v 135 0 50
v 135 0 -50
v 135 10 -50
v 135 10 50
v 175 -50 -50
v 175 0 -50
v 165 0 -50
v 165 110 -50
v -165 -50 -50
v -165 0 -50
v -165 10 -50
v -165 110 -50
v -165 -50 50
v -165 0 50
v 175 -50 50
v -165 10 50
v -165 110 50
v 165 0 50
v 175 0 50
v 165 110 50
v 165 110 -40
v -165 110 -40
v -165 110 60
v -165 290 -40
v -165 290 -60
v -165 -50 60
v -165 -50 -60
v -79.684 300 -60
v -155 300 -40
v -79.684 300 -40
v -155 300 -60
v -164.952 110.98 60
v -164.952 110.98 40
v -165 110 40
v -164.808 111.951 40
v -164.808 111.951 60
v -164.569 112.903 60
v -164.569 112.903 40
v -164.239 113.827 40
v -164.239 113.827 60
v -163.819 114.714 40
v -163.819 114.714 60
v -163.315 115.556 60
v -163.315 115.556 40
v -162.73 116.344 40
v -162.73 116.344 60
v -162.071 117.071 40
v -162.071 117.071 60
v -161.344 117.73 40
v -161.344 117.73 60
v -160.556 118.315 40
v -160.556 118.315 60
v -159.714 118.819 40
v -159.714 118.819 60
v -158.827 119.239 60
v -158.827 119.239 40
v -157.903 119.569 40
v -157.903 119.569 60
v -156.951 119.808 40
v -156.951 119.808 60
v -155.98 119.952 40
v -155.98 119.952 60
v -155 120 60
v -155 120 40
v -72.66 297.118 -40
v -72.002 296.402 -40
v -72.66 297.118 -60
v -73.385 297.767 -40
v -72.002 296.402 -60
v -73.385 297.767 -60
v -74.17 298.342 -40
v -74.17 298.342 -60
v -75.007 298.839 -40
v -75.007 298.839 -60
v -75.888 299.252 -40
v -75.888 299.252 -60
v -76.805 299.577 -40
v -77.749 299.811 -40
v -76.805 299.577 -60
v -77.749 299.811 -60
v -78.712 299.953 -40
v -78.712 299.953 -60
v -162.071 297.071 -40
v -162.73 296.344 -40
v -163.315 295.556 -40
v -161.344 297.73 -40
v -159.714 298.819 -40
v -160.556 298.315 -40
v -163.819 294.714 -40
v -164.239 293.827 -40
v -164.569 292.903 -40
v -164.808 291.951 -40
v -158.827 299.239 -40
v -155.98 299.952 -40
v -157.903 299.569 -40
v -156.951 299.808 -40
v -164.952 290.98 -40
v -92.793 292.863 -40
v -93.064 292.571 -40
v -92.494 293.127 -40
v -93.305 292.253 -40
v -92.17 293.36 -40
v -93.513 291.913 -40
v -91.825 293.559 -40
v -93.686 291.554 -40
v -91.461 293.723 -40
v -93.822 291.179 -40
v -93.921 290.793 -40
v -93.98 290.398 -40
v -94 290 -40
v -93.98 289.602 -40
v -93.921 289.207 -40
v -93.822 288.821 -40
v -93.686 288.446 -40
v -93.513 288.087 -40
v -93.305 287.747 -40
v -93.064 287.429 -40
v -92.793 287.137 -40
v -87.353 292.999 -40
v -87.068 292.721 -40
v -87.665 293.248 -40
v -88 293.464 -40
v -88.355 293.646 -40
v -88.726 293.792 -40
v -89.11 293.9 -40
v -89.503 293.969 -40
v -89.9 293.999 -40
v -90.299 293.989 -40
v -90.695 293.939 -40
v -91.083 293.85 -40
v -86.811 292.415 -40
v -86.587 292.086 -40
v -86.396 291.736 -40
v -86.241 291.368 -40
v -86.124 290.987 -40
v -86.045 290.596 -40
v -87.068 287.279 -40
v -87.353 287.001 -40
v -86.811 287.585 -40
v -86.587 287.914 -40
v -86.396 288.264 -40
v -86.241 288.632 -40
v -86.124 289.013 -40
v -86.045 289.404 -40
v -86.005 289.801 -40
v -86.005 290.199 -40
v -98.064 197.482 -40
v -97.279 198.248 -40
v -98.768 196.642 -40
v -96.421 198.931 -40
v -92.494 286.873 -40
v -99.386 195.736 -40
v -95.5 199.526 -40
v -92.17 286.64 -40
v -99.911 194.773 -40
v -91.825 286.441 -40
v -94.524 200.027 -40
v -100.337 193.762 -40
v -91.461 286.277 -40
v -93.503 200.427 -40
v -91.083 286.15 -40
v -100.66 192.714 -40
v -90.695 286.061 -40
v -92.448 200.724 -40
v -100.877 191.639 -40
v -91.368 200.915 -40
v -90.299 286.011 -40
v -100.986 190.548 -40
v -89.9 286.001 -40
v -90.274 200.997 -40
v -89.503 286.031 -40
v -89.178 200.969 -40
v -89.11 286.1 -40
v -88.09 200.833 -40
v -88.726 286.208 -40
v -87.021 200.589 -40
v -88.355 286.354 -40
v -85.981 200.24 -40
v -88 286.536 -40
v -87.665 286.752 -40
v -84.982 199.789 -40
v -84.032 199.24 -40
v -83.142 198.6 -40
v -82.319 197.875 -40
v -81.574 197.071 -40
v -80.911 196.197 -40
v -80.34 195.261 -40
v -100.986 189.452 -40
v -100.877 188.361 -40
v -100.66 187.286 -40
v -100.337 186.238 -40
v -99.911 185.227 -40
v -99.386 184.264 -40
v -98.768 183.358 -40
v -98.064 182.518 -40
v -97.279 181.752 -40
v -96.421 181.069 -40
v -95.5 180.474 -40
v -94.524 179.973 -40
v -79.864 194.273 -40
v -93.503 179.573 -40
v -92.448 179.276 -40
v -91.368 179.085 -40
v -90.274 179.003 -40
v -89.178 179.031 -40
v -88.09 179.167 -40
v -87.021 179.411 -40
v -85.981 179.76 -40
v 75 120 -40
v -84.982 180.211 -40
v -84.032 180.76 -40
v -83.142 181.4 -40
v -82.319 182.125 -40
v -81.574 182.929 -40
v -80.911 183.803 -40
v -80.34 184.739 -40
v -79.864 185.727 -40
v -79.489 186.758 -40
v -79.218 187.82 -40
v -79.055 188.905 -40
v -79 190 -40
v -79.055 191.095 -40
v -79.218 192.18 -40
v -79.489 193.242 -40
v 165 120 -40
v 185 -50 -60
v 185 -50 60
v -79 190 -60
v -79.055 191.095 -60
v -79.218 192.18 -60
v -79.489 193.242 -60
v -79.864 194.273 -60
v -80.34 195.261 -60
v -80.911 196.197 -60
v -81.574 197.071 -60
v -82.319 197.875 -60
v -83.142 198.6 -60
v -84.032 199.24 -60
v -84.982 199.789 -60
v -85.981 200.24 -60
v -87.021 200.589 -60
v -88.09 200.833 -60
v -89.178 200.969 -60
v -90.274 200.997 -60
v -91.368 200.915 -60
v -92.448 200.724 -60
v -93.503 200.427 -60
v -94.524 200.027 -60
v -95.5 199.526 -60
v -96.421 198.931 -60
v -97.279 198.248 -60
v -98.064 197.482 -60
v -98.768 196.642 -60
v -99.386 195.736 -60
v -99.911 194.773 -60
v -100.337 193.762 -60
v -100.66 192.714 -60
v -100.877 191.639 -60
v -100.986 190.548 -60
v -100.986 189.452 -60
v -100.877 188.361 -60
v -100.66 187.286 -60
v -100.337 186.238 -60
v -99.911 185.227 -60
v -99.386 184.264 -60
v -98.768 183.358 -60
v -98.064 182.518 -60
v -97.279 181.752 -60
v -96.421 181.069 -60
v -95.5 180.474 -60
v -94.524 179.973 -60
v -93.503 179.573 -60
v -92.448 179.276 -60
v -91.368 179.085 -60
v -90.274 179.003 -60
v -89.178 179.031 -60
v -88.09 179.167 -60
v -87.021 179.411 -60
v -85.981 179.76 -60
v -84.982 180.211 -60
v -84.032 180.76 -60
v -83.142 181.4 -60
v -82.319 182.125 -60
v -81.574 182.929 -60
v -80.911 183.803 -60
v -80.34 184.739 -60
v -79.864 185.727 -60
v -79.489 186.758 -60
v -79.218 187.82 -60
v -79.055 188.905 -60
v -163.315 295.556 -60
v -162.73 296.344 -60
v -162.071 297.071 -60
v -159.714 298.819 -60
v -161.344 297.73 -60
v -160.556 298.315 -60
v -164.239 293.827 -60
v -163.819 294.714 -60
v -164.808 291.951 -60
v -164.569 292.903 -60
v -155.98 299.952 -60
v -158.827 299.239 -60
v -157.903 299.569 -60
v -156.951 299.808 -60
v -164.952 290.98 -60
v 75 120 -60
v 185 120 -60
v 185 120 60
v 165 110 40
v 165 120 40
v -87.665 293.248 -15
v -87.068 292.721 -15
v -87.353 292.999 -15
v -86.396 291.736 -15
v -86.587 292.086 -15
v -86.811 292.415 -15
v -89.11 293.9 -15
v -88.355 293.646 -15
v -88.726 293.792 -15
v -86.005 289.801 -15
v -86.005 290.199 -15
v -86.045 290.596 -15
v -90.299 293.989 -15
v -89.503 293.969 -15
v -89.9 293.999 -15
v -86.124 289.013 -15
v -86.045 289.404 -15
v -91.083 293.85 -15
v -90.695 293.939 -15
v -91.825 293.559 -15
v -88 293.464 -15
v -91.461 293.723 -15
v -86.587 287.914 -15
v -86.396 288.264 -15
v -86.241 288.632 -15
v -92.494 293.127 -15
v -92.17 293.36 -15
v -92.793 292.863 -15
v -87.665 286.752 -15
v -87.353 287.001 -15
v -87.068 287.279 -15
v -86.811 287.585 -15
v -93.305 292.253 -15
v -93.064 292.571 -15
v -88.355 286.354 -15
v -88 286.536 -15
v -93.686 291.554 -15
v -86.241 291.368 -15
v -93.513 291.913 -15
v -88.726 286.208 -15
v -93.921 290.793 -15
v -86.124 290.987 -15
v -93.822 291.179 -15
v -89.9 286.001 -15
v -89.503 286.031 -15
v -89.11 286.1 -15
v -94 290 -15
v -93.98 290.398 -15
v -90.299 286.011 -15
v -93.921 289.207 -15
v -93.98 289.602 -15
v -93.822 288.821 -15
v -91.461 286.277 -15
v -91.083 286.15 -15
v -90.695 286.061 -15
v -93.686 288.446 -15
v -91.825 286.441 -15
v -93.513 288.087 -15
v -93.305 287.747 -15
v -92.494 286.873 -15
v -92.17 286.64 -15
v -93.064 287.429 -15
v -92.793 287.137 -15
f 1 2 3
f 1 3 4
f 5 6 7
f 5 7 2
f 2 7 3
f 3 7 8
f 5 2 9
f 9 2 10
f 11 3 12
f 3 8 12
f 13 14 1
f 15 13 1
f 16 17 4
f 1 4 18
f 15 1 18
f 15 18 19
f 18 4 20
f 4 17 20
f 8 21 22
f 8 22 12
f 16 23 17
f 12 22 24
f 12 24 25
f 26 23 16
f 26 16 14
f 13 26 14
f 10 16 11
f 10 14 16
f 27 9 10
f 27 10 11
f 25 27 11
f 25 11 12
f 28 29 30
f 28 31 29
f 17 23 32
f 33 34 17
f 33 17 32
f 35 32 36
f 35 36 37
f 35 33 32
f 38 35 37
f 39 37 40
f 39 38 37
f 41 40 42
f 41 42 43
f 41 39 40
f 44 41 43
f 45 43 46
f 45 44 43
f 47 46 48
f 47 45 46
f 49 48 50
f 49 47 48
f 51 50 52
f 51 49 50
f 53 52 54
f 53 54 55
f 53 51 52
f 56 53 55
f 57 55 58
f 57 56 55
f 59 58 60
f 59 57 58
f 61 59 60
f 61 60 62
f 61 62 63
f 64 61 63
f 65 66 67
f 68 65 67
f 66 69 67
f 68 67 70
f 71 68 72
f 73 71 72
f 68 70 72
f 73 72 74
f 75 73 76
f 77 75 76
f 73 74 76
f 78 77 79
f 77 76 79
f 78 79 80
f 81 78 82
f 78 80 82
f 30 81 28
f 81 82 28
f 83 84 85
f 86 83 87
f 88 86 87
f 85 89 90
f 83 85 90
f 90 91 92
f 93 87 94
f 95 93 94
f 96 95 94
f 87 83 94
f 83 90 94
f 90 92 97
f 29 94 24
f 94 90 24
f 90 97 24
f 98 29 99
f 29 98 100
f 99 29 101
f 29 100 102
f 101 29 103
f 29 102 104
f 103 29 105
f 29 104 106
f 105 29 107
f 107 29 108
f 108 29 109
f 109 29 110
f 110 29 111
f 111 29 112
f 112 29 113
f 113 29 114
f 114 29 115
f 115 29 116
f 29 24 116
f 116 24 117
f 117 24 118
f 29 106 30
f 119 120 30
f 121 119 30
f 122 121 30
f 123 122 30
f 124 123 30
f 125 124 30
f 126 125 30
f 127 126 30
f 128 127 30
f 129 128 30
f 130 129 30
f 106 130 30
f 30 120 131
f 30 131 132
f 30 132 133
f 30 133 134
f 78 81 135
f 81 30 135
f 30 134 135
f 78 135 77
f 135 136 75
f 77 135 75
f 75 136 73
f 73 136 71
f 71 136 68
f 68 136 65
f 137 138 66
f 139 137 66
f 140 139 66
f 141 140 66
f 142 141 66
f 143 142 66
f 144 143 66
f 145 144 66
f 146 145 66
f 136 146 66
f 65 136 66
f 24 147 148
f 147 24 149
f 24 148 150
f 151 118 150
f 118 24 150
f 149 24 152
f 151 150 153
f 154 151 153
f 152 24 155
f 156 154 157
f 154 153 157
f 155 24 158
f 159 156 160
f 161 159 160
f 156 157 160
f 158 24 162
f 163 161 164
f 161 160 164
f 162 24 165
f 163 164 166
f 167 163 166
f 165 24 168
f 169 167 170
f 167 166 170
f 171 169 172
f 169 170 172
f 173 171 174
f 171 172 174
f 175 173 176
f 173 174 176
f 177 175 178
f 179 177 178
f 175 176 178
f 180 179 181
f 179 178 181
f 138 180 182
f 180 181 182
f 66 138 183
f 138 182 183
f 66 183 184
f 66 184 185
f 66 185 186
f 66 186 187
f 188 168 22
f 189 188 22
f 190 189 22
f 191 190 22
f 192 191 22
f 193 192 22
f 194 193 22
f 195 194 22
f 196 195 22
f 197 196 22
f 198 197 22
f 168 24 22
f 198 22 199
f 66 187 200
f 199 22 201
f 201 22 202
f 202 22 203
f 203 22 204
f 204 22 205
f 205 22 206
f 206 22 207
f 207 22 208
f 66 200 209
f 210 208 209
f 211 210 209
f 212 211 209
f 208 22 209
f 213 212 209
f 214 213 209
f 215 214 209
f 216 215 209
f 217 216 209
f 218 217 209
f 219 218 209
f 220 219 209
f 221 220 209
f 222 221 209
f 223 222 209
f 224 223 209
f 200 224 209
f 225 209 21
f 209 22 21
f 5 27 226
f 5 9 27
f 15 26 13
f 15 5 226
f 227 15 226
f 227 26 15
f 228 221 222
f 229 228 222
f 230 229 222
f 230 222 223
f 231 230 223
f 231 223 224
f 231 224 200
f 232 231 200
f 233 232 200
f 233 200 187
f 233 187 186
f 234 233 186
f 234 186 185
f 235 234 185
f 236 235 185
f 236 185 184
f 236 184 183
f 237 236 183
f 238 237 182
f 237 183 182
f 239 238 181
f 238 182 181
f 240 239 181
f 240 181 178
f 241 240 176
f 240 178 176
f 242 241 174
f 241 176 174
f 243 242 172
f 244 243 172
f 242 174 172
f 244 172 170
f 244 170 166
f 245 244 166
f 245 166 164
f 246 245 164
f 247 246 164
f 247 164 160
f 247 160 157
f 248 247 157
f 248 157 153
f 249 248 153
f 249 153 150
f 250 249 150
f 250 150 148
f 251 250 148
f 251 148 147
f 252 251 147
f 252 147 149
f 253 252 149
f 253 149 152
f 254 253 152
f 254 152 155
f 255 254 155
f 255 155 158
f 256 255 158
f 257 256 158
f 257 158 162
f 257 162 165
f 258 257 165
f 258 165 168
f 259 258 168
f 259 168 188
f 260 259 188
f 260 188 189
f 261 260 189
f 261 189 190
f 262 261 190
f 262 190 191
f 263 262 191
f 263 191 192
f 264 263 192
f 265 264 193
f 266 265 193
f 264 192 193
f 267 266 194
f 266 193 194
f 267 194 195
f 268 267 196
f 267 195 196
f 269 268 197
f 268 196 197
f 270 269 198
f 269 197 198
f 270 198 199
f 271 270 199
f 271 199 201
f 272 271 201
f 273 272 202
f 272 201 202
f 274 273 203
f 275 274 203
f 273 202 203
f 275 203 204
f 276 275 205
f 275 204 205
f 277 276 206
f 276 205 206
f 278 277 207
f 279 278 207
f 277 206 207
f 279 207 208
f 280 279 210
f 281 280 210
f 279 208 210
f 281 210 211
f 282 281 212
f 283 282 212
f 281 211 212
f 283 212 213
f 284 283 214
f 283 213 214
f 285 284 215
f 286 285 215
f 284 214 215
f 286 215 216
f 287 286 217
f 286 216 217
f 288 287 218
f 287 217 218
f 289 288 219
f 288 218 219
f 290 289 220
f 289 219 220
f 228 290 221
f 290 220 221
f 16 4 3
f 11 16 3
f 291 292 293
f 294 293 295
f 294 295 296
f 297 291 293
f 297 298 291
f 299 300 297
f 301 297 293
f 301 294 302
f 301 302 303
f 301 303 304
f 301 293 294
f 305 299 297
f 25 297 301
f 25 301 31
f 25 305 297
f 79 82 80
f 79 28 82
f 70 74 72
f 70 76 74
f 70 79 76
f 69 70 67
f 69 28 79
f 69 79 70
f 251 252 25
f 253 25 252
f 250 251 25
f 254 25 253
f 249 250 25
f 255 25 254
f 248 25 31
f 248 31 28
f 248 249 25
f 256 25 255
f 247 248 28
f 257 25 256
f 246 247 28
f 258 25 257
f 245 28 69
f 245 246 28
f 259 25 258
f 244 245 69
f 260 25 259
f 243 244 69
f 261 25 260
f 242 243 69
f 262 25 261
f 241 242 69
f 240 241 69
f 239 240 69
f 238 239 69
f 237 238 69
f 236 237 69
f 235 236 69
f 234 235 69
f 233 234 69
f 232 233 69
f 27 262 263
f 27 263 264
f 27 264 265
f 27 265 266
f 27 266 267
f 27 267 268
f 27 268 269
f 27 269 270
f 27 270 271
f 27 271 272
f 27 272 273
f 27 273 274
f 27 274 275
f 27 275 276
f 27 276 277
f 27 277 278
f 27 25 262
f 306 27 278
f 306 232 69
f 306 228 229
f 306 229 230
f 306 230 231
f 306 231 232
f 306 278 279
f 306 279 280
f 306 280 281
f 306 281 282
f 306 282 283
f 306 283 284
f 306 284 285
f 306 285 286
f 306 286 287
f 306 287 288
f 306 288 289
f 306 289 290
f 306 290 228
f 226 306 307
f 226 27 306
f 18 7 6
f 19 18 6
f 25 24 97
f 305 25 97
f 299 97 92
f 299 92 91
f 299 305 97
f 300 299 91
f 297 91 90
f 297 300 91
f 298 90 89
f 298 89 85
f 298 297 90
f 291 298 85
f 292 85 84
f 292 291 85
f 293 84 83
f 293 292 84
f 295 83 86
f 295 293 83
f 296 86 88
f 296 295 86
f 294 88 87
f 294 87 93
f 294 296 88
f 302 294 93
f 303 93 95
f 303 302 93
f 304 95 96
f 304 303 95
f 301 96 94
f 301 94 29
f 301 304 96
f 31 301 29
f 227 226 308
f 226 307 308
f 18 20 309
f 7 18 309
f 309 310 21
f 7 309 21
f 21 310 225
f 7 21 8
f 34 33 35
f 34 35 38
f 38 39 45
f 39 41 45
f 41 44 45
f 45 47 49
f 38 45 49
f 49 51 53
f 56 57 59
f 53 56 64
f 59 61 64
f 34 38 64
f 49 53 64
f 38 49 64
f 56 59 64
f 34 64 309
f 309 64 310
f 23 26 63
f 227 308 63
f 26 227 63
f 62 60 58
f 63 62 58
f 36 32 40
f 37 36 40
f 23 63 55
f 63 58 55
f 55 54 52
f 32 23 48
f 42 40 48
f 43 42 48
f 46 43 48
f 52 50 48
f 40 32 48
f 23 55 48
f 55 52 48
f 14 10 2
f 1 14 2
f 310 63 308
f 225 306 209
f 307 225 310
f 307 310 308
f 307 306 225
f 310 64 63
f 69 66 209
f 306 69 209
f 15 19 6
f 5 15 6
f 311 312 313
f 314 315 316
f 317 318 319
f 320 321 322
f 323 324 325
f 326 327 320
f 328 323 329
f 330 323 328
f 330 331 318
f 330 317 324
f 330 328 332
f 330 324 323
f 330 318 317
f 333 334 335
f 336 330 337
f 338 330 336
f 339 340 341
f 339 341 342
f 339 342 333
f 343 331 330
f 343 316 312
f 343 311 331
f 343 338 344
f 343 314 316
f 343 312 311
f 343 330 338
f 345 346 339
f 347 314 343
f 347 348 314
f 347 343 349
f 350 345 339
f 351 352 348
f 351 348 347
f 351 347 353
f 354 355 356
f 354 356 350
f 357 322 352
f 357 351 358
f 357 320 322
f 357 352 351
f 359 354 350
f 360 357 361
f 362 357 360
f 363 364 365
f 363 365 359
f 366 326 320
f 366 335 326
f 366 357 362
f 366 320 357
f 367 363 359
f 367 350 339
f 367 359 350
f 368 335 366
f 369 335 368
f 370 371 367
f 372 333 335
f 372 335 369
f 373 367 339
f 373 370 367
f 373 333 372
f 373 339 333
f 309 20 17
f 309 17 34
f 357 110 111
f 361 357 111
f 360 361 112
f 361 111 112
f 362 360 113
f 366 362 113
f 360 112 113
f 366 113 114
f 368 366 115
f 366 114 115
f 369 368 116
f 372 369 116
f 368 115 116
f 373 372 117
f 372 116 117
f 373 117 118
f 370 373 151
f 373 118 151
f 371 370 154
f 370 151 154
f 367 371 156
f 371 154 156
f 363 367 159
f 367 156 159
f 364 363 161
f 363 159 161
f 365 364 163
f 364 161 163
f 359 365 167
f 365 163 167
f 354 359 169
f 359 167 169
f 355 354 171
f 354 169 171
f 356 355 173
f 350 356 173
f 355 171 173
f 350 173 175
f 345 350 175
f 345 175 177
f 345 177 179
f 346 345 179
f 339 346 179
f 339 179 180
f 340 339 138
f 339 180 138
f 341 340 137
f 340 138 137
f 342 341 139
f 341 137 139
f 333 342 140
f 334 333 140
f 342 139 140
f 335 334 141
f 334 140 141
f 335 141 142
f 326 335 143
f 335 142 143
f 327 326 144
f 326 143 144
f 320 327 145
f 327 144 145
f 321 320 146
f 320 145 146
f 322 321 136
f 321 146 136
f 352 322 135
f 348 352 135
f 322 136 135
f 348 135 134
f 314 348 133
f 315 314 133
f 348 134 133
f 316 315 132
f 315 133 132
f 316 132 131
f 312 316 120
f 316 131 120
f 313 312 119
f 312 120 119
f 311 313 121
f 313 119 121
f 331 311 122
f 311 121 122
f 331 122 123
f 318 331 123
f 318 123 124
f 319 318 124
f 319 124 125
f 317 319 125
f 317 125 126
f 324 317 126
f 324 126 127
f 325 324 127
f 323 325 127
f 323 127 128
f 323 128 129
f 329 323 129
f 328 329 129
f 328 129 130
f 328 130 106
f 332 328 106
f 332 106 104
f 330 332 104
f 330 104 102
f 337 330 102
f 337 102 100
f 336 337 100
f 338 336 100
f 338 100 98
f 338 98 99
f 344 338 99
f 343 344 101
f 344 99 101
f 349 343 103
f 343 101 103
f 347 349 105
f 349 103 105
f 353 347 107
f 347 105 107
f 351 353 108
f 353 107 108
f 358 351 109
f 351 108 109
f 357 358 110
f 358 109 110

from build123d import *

# Parameters (mm, degrees)
SKETCH1_W           = 330
SKETCH1_H           = 120
BOSS_EXTRUDE1_DEPTH = 120
SKETCH2_W           = 100
SKETCH2_H           = 100
CUT_EXTRUDE1_DEPTH  = 357.230262611
CUT_EXTRUDE2_REACH  = 214.662
SKETCH5_W           = 330
SKETCH5_H           = 80
SKETCH6_W           = 40
SKETCH6_H           = 20
BOSS_EXTRUDE2_DEPTH = 180
SKETCH9_R           = 4
BOSS_EXTRUDE3_DEPTH = 25
SKETCH11_W          = 20
SKETCH11_H          = 120
EXTRUDE_THIN1_DEPTH = 120
CUT_EXTRUDE3_REACH  = 359.526
SKETCH12_W          = 30
SKETCH12_H          = 100
EXTRUDE_THIN2_DEPTH = 50
BOSS_EXTRUDE5_DEPTH = 20
FILLET1_R           = 10
SKETCH9_4_R         = 11
CUT_EXTRUDE4_DEPTH  = 367.367302034
SKETCH17_W          = 50
SKETCH17_H          = 20
BOSS_EXTRUDE6_DEPTH = 180
FILLET6_R           = 10


with BuildPart() as part:
    # Sketch1 → Boss-Extrude1 (new body)
    with BuildSketch(Plane(origin=(0, 0, 0), x_dir=(1, 0, 0), z_dir=(0, 1, 0))):
        Rectangle(SKETCH1_W, SKETCH1_H)
    extrude(amount=BOSS_EXTRUDE1_DEPTH)

    # Sketch2 → Cut-Extrude1 (cut, through all)
    with BuildSketch(Plane(origin=(165, 0, 0), x_dir=(0, 0, -1), z_dir=(1, 0, 0))):
        with Locations((0, 60)):
            Rectangle(SKETCH2_W, SKETCH2_H)
    extrude(amount=-CUT_EXTRUDE1_DEPTH, mode=Mode.SUBTRACT)

    # Sketch5 → Cut-Extrude2 (cut, up to next)
    with BuildSketch(Plane(origin=(0, 120, 0), x_dir=(1, 0, 0), z_dir=(0, 1, 0)), mode=Mode.PRIVATE) as cut_extrude2_sk1:
        Rectangle(SKETCH5_W, SKETCH5_H)
    cut_extrude2_tool1 = extrude(cut_extrude2_sk1.sketch, amount=-CUT_EXTRUDE2_REACH, mode=Mode.PRIVATE) & part.part
    add(cut_extrude2_tool1.solids().sort_by_distance((0, 120, 0))[0], mode=Mode.SUBTRACT)

    # Sketch6 → Boss-Extrude2 (add)
    with BuildSketch(Plane(origin=(0, 120, 0), x_dir=(1, 0, 0), z_dir=(0, 1, 0))):
        with Locations((-95, 50)):
            Rectangle(SKETCH6_W, SKETCH6_H)
    extrude(amount=BOSS_EXTRUDE2_DEPTH)

    # Sketch9 → Boss-Extrude3 (add)
    with BuildSketch(Plane.XY.offset(-40)):
        with Locations(Location((-90, 290, 0), (0, 0, 180))):
            Circle(SKETCH9_R)
    extrude(amount=BOSS_EXTRUDE3_DEPTH)

    # Sketch11 → Extrude-Thin1 (add, through all)
    with BuildSketch(Plane(origin=(0, 120, 0), x_dir=(1, 0, 0), z_dir=(0, 1, 0))):
        with Locations((175, 0)):
            Rectangle(SKETCH11_W, SKETCH11_H)
    extrude(amount=-EXTRUDE_THIN1_DEPTH)

    # Sketch12 → Cut-Extrude3 (cut, up to next)
    with BuildSketch(Plane.XZ, mode=Mode.PRIVATE) as cut_extrude3_sk1:
        with Locations((150, 0)):
            Rectangle(SKETCH12_W, SKETCH12_H)
    cut_extrude3_tool1 = extrude(cut_extrude3_sk1.sketch, amount=-CUT_EXTRUDE3_REACH, mode=Mode.PRIVATE) & part.part
    add(cut_extrude3_tool1.solids().sort_by_distance((150, 0, 0))[0], mode=Mode.SUBTRACT)

    # Sketch14 → Extrude-Thin2 (add)
    with BuildSketch(Plane.XZ):
        Polygon((-165, -60), (185, -60), (185, 60), (-165, 60), (-165, 50), (175, 50), (175, -50), (-165, -50), align=None)
    extrude(amount=EXTRUDE_THIN2_DEPTH)

    # Sketch16 → Boss-Extrude5 (add, through all)
    with BuildSketch(Plane.XY.offset(-40)):
        Polygon((-75, 300), (75, 120), (-75, 120), align=None)
    extrude(amount=-BOSS_EXTRUDE5_DEPTH)

    # Fillet1
    fillet1_edges = [part.edges().sort_by_distance(p)[0] for p in [
        (-75, 300, -50),
    ]]
    fillet(fillet1_edges, radius=FILLET1_R)

    # Sketch9<4> → Cut-Extrude4 (cut, through all)
    with BuildSketch(Plane.XY.offset(-40)):
        with Locations((-90, 190)):
            Circle(SKETCH9_4_R)
    extrude(amount=-CUT_EXTRUDE4_DEPTH, mode=Mode.SUBTRACT)

    # Sketch17 → Boss-Extrude6 (add, through all)
    with BuildSketch(Plane(origin=(0, 120, 0), x_dir=(1, 0, 0), z_dir=(0, 1, 0))):
        with Locations((-140, 50)):
            Rectangle(SKETCH17_W, SKETCH17_H)
    extrude(amount=BOSS_EXTRUDE6_DEPTH)

    # Fillet6
    fillet6_edges = [part.edges().sort_by_distance(p)[0] for p in [
        (-165, 120, 50),
        (-165, 300, -50),
    ]]
    fillet(fillet6_edges, radius=FILLET6_R)


solid = part.part
